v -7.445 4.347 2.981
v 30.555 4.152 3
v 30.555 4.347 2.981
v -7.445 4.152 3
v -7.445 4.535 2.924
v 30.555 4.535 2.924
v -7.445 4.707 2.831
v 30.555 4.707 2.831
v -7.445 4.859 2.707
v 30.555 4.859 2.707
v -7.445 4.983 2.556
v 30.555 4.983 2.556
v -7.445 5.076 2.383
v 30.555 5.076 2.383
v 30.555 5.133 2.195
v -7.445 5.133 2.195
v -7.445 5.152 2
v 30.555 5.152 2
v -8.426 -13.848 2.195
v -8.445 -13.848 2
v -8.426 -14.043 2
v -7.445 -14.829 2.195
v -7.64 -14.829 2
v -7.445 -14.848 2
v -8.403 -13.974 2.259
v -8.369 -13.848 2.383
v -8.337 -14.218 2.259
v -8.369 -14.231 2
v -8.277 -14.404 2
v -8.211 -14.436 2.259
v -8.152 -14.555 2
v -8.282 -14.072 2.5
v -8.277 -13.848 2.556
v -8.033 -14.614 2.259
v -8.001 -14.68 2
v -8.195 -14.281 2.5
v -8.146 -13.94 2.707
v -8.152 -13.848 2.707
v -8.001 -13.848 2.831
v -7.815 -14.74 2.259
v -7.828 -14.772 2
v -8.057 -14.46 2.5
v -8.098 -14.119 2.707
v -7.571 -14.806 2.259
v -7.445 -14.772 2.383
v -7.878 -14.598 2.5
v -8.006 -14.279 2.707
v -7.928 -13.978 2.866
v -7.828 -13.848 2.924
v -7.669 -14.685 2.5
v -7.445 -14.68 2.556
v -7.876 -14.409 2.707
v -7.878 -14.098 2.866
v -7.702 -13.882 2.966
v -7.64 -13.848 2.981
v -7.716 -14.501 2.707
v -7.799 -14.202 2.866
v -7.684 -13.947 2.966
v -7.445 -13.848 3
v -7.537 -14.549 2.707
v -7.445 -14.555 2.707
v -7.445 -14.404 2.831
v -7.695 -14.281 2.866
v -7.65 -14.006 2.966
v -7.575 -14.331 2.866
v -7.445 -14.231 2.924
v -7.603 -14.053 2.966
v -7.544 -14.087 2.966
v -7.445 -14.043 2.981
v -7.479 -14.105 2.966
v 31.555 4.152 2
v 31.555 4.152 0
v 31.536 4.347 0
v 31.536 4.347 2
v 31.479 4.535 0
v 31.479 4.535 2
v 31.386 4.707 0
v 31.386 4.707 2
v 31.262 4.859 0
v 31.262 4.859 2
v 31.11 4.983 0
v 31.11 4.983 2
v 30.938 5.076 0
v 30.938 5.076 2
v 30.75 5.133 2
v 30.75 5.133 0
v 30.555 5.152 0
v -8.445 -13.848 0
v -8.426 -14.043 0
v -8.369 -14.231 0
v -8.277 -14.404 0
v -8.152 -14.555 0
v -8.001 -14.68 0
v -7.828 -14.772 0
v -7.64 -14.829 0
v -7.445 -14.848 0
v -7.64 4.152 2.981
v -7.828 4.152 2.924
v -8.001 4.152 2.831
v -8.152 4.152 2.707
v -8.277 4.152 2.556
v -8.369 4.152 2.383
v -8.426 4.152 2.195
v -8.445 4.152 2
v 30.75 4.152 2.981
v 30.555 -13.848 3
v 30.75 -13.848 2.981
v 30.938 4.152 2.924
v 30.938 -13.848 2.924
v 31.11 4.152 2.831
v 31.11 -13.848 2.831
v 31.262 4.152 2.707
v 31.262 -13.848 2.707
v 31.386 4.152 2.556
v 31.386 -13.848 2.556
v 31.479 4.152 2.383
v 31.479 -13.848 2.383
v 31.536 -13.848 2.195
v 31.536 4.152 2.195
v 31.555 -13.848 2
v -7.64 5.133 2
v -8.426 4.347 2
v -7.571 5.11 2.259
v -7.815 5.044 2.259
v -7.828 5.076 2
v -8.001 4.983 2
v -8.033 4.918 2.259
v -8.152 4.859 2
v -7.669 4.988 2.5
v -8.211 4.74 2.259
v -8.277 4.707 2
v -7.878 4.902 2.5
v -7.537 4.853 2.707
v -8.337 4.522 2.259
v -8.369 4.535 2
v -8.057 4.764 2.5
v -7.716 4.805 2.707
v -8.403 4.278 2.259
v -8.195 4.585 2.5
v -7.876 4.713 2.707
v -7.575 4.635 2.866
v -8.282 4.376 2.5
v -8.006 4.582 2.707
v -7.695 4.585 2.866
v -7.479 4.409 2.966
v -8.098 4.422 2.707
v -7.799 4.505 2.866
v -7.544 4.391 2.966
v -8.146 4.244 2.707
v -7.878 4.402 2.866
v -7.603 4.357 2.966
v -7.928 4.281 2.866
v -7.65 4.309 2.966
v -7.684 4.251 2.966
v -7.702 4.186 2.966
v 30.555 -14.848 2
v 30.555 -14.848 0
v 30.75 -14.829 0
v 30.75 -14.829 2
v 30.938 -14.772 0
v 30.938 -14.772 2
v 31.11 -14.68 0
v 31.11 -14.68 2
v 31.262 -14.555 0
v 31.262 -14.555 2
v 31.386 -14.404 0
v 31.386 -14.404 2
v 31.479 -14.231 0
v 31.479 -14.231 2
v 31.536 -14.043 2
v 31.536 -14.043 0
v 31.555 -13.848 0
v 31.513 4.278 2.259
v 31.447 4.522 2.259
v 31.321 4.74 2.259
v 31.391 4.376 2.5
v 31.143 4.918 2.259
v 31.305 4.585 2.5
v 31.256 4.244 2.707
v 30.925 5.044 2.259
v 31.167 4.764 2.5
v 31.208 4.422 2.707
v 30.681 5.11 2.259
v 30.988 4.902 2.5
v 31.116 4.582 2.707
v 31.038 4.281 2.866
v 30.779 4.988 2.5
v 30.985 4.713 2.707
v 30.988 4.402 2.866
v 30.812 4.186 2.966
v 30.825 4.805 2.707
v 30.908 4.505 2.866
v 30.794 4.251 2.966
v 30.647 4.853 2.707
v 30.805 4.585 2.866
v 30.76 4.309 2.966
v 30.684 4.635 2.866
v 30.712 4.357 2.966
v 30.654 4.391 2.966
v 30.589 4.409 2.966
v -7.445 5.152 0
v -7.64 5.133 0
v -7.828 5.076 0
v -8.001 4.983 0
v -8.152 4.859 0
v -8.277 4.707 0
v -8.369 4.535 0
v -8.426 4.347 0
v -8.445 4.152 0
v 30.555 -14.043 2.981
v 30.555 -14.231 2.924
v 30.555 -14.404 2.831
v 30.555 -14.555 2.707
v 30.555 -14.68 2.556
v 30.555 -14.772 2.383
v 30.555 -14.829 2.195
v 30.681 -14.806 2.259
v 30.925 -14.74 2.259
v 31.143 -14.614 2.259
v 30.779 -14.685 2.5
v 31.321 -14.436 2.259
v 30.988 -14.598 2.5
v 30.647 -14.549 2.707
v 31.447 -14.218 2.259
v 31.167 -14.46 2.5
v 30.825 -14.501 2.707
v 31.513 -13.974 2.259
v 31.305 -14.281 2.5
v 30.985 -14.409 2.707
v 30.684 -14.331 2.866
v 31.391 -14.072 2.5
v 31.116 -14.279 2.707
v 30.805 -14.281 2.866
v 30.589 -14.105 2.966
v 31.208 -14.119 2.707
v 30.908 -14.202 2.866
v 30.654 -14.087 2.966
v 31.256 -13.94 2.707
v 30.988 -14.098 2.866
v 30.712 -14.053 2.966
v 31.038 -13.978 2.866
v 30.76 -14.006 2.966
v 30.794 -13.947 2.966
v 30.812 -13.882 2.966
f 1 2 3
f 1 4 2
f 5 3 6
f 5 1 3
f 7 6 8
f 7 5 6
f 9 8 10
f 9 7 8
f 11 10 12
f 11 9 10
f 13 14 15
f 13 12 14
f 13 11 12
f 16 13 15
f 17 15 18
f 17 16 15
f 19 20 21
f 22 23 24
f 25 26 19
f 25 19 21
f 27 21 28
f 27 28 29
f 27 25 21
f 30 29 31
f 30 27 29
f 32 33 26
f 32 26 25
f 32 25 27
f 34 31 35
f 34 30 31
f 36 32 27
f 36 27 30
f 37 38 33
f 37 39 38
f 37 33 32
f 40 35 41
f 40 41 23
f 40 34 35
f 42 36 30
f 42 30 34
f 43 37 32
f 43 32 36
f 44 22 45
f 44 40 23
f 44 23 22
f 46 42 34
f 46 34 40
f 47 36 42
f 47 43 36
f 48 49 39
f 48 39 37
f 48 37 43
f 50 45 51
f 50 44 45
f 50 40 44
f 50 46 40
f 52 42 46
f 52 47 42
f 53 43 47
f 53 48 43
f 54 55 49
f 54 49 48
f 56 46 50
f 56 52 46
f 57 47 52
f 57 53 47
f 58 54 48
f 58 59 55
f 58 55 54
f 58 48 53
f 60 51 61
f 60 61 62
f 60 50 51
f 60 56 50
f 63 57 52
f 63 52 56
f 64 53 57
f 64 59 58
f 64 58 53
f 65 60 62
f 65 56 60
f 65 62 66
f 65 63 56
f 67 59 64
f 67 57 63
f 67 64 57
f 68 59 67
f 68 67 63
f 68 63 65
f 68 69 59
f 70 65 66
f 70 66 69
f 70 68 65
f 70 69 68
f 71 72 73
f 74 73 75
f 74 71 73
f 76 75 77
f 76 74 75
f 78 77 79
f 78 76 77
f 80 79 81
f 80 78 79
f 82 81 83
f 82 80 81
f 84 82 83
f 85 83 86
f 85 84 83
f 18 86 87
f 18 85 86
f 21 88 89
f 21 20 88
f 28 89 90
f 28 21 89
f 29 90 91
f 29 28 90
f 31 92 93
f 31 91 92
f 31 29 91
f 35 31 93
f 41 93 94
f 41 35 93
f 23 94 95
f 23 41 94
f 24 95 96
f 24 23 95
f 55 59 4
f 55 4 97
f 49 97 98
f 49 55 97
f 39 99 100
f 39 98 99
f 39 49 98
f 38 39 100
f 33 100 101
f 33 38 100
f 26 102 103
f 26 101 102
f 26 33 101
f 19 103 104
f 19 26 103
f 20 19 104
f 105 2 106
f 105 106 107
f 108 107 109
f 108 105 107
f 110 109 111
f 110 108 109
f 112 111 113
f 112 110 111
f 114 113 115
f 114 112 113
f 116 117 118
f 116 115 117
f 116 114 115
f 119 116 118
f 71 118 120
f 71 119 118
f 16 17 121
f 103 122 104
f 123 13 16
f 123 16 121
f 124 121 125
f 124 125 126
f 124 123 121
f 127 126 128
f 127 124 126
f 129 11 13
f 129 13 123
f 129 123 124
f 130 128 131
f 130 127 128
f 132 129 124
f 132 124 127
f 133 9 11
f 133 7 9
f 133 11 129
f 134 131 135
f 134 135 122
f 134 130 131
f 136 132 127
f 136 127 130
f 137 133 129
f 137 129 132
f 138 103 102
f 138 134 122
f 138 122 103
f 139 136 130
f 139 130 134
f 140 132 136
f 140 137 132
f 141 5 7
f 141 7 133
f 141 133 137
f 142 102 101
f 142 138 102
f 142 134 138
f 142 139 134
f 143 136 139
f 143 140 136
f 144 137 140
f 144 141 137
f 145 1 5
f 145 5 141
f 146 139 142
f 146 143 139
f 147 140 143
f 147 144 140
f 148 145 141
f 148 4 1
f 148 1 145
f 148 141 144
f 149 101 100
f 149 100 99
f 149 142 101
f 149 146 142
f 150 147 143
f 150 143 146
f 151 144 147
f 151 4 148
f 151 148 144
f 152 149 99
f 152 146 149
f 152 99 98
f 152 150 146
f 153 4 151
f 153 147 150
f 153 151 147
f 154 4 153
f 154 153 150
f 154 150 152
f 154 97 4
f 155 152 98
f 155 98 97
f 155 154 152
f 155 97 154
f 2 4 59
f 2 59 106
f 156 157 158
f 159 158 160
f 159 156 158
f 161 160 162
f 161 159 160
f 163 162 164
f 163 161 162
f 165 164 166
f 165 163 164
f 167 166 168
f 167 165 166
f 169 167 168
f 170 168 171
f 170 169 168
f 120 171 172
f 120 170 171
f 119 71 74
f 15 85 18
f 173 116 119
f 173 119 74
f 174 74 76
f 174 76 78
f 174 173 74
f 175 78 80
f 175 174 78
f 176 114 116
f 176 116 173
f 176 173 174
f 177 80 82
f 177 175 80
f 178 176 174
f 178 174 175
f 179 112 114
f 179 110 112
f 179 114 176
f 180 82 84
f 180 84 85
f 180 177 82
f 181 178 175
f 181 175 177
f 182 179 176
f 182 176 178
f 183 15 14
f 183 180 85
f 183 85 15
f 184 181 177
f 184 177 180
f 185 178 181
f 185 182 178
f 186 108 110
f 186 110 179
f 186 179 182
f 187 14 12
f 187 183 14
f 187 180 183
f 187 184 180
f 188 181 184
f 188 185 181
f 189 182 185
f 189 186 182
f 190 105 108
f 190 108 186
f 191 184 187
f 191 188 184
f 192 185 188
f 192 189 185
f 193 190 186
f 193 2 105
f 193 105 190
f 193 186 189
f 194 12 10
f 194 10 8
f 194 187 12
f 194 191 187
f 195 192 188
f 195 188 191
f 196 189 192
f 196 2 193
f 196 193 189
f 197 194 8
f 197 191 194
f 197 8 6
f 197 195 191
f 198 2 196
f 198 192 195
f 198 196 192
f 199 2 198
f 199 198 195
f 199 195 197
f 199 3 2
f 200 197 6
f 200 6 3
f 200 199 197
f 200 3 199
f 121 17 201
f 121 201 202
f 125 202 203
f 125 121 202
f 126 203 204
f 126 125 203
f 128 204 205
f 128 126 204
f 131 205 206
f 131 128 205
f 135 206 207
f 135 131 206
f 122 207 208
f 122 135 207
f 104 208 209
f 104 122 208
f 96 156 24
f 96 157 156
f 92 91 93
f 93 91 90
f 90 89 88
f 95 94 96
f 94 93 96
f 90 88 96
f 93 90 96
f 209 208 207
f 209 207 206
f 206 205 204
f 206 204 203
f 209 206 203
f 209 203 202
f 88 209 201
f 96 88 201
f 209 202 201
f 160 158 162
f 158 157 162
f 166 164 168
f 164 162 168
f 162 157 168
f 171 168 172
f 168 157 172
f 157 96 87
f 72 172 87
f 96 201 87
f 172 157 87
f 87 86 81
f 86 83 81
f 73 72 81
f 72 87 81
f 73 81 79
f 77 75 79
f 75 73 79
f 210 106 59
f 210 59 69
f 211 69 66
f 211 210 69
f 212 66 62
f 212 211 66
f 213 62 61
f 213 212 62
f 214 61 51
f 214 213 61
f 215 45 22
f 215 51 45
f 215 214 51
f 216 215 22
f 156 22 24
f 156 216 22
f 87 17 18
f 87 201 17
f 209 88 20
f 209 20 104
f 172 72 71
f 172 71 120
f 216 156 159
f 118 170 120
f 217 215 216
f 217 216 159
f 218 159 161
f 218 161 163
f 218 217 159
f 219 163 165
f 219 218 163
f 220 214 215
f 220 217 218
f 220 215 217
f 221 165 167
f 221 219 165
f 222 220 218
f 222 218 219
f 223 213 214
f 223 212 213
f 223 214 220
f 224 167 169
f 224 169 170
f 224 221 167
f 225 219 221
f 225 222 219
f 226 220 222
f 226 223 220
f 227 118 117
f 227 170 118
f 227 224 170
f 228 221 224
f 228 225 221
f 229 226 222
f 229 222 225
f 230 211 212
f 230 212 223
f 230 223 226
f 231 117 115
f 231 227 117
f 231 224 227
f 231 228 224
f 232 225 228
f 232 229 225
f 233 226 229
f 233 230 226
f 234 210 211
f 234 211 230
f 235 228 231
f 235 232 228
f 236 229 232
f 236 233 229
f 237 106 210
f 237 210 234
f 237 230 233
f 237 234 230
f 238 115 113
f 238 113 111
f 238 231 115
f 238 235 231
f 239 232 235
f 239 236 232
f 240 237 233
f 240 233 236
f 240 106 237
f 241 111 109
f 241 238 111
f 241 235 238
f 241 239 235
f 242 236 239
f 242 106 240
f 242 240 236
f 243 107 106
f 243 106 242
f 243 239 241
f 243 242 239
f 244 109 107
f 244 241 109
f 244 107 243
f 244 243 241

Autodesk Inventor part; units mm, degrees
ref_plane "YZ Plane" through (0, 0, 0) normal (1, 0, 0) x (0, 1, 0)
ref_plane "XZ Plane" through (0, 0, 0) normal (0, 1, 0) x (-1, 0, 0)
ref_plane "XY Plane" through (0, 0, 0) normal (0, 0, 1) x (1, 0, 0)
sketch "Szkic1" plane through (0, 0, 0) normal (0, 0, 1) x (1, 0, 0)
  line L0 (-8.4451, 5.1519) -> (31.5549, 5.1519)
  line L1 (31.5549, 5.1519) -> (31.5549, -14.8481)
  line L2 (31.5549, -14.8481) -> (-8.4451, -14.8481)
  line L3 (-8.4451, -14.8481) -> (-8.4451, 5.1519)
  point P0 (0, 0)
  dimension "d0" = 40
  dimension "d1" = 20
extrude "Wyciągnięcie proste1" add sketch "Szkic1" along normal blind 3
fillet "Zaokrąglenie1" radius 1 4 edges at (-8.4451, 5.1519, 1.5) (31.5549, 5.1519, 1.5) (31.5549, -14.8481, 1.5) (-8.4451, -14.8481, 1.5)
fillet "Zaokrąglenie2" radius 1 8 edges at (-8.1522, 4.859, 3) (-8.4451, -4.8481, 3) (-8.1522, -14.5552, 3) (11.5549, -14.8481, 3) (31.262, -14.5552, 3) (31.5549, -4.8481, 3) (31.262, 4.859, 3) (11.5549, 5.1519, 3)
properties part number "COTS_GENERIC_20x40_Alu_Extrusion_Endcap"
